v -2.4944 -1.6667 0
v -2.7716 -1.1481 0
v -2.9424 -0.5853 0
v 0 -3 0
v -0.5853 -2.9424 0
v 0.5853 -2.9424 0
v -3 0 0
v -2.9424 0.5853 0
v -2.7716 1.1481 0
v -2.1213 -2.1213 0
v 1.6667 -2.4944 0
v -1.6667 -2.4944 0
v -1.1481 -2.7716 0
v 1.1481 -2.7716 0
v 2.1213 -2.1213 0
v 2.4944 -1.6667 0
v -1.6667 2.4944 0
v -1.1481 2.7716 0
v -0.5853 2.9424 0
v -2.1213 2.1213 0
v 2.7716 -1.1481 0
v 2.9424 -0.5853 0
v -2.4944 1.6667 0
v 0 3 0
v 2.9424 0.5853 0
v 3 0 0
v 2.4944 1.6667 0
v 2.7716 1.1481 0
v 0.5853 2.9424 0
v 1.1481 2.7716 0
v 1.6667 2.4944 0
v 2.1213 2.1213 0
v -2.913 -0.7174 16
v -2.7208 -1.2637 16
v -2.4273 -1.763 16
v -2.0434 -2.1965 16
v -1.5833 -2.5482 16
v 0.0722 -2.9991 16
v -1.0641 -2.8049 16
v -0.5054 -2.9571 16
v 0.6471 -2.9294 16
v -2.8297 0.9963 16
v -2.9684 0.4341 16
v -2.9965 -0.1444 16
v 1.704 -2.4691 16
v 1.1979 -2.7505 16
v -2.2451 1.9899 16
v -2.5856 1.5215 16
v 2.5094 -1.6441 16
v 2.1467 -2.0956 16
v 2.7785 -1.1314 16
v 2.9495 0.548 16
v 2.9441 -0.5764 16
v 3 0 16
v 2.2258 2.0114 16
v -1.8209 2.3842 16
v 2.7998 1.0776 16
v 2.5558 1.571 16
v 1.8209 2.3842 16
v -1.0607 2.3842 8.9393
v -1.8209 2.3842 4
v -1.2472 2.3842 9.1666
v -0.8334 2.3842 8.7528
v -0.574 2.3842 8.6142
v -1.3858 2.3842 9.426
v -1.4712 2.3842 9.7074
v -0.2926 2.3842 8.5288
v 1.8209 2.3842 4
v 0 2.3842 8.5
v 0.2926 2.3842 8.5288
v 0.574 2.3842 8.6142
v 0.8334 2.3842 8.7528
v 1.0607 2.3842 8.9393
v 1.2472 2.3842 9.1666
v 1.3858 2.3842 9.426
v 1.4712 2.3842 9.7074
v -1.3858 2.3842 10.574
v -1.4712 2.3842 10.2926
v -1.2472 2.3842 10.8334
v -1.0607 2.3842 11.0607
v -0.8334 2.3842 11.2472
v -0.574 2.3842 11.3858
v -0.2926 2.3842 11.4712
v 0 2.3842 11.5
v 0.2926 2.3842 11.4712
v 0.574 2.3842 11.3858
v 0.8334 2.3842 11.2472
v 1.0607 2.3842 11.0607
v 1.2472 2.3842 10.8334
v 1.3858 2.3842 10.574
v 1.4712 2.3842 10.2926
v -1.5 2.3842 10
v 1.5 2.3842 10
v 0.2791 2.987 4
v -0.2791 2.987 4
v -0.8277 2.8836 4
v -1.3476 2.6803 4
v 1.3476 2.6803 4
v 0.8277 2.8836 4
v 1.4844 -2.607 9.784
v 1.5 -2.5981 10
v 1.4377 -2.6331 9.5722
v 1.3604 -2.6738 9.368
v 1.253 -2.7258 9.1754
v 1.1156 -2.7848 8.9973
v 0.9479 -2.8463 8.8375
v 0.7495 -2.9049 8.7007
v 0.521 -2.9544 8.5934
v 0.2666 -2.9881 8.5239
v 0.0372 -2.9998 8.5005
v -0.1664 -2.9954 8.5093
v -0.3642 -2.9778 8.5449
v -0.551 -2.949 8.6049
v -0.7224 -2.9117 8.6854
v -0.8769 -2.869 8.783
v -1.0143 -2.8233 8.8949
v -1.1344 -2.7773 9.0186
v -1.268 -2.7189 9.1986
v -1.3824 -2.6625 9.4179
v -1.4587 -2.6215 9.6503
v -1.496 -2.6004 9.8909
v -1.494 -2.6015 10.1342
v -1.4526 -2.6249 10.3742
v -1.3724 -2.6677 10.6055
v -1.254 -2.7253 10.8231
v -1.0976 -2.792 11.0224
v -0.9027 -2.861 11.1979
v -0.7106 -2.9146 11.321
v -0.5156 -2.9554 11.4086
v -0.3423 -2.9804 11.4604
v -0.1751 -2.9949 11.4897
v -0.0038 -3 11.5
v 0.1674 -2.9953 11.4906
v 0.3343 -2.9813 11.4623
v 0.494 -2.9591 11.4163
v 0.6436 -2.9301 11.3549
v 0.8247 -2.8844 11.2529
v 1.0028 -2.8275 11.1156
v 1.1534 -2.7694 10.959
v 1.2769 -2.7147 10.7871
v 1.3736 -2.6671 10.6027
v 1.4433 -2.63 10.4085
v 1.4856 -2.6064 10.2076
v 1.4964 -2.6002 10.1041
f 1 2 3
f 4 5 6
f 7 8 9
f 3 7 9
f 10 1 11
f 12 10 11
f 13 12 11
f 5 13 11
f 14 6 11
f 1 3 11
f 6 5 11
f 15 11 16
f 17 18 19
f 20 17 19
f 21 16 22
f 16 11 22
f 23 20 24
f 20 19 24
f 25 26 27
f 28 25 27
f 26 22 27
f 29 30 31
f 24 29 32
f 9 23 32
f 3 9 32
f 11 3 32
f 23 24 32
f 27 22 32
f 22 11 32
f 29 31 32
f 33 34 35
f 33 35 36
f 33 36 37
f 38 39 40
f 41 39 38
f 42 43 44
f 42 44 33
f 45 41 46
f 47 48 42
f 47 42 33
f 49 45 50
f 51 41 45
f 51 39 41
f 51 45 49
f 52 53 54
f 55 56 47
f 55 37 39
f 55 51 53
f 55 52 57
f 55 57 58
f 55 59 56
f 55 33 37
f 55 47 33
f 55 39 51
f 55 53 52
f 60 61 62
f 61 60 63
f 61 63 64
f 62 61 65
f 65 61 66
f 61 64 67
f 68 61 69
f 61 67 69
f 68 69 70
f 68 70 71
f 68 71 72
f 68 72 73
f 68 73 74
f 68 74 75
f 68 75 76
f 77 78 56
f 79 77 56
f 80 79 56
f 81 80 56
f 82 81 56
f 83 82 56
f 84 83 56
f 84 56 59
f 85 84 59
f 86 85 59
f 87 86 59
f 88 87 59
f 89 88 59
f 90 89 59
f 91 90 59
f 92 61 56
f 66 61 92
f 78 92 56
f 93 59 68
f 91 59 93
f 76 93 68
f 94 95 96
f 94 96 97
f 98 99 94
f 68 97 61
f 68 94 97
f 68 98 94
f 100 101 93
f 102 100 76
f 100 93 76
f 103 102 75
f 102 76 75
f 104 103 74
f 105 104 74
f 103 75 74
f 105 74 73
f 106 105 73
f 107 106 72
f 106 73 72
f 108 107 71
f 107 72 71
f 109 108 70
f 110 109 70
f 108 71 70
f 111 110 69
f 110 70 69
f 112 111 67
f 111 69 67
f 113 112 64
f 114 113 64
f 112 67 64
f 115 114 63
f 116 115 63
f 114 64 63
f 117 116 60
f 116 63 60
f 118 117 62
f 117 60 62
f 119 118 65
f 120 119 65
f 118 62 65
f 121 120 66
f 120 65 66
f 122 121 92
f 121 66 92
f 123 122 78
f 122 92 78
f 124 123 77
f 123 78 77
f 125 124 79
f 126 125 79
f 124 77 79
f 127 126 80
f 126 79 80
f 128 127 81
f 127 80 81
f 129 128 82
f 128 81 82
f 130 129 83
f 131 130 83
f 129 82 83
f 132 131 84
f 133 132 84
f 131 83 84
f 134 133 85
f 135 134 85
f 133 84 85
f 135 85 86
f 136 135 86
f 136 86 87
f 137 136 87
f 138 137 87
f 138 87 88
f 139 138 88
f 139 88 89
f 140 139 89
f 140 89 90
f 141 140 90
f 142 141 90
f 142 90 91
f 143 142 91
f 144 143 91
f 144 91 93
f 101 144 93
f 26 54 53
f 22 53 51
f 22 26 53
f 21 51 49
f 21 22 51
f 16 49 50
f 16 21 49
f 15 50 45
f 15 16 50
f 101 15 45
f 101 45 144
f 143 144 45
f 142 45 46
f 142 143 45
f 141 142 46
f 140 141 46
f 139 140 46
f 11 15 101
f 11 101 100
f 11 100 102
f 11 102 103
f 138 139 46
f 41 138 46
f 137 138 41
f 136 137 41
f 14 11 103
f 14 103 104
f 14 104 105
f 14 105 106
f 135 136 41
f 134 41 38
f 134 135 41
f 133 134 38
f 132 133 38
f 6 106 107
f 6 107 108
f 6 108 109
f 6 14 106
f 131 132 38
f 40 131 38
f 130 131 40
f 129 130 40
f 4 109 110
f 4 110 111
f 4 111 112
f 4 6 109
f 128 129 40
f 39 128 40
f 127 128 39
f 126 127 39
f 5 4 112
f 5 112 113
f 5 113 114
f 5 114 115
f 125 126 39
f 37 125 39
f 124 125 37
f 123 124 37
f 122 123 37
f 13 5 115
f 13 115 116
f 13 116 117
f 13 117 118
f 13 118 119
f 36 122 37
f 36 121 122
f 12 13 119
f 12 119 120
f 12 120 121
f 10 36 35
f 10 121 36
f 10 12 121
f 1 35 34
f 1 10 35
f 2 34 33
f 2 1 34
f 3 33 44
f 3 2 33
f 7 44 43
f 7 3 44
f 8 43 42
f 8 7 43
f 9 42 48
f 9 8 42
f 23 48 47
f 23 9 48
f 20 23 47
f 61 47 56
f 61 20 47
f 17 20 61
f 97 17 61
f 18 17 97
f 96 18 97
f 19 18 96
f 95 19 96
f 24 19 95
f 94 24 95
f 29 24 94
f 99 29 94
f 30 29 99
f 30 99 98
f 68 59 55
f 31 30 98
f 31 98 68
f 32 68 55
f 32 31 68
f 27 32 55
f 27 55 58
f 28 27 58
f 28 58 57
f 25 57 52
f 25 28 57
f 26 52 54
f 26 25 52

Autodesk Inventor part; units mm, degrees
ref_plane "YZ Plane" through (0, 0, 0) normal (1, 0, 0) x (0, 1, 0)
ref_plane "XZ Plane" through (0, 0, 0) normal (0, 1, 0) x (-1, 0, 0)
ref_plane "XY Plane" through (0, 0, 0) normal (0, 0, 1) x (1, 0, 0)
sketch "Sketch1" plane through (0, 0, 0) normal (0, 0, 1) x (1, 0, 0)
  circle A0 centre (0, 0) radius 3 projected
  circle A1 centre (0, 0) radius 5 projected
  dimension "d0" = 10
  dimension "d1" = 6
extrude "Extrusion1" add sketch "Sketch1" along normal blind 16 contours A0
sketch "Sketch2" plane through (0, 0, 16) normal (0, 0, 1) x (1, 0, 0)
  circle A0 centre (0, 0) radius 3 projected
  line L0 (-1.8209, 2.3842) -> (1.8209, 2.3842)
  line L1 (-3, 0) -> (3, 0)
extrude "Extrusion2" cut sketch "Sketch2" against normal blind 12 contours L0 A0
sketch "Sketch3" plane through (-1.8209, 2.3842, 16) normal (0, 1, 0) x (1, 0, 0)
  circle A0 centre (1.8209, 6) radius 1.5
  line L0 (3.6417, 0) -> (0, 0) projected
  point P0 (1.8209, 16)
  dimension "d6" = 6
  dimension "d7" = 3
extrude "Extrusion3" cut sketch "Sketch3" against normal up to surface
thread "Thread1" size "M3x0.5" class "6H" standard "ANSI Metric M Profile" length 60
properties part number "motor shaft" material "Steel, Mild"
